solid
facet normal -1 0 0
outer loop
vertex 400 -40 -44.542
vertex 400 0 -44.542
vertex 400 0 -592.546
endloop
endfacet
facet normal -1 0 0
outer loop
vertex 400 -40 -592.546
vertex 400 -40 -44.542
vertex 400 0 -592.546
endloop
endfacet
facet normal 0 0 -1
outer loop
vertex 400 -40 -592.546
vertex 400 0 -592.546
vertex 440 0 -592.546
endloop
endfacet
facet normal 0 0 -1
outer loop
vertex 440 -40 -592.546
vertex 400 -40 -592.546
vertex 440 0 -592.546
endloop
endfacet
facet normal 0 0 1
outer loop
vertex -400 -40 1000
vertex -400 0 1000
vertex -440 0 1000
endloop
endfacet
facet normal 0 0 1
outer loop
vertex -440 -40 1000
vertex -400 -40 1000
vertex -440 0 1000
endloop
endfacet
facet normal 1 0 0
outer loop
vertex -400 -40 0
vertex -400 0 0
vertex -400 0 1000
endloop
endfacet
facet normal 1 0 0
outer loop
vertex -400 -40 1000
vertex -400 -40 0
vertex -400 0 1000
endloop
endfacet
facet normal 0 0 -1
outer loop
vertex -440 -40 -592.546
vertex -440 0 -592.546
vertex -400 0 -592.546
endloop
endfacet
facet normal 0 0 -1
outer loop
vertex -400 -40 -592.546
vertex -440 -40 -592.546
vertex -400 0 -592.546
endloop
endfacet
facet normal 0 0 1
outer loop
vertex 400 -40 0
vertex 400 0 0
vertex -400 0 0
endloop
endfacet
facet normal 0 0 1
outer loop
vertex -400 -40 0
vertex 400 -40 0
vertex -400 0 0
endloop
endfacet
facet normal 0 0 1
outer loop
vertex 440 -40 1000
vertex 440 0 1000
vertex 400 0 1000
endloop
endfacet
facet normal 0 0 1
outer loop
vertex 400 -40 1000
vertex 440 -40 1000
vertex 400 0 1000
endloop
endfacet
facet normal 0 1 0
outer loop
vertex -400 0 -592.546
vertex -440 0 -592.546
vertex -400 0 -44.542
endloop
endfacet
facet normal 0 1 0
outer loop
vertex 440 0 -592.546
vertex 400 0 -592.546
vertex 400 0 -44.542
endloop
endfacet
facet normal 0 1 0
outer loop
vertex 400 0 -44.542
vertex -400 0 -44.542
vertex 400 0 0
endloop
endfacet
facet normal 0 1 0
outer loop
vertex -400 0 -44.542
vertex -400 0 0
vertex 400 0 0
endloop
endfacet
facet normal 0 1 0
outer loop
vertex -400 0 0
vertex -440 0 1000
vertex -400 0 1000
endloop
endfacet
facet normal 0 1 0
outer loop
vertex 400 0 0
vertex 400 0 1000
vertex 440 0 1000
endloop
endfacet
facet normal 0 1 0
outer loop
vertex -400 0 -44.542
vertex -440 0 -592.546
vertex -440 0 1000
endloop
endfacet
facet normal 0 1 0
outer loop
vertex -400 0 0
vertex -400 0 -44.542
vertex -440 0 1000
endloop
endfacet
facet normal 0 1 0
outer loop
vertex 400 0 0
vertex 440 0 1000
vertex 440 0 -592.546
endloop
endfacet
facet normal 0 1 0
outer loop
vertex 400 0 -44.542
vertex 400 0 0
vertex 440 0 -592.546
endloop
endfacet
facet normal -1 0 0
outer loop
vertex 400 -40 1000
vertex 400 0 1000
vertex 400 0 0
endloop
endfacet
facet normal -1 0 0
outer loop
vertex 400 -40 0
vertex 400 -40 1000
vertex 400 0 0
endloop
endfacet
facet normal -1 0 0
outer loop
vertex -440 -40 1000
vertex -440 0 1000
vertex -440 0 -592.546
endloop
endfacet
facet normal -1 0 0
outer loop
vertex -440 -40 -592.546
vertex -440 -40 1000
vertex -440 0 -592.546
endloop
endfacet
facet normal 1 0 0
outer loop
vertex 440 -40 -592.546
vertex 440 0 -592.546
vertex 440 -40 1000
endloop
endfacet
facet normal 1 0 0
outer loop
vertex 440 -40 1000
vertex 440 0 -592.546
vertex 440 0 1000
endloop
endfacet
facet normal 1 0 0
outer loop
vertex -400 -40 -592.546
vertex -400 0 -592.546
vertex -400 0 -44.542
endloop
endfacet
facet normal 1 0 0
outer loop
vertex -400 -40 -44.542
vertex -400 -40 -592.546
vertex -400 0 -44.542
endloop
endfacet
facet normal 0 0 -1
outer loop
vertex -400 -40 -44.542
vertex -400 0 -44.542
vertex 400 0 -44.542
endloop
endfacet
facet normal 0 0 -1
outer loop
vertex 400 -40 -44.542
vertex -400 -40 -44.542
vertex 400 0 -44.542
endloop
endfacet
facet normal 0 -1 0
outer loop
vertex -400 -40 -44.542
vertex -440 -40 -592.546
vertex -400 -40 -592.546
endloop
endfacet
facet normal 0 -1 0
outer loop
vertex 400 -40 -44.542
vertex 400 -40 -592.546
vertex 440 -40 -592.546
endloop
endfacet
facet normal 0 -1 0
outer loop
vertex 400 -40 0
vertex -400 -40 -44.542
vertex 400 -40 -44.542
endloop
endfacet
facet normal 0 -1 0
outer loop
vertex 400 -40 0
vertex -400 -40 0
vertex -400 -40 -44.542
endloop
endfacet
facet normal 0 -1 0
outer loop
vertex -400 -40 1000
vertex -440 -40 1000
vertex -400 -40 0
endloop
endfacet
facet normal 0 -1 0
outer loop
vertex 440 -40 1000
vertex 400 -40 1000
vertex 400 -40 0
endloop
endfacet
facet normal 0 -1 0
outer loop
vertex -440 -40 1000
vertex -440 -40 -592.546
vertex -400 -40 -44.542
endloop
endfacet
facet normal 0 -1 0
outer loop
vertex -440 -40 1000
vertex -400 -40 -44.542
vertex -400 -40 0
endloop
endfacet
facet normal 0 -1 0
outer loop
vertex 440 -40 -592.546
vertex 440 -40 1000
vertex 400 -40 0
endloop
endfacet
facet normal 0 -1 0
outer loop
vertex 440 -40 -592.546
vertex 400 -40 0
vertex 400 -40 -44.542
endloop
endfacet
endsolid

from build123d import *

# Parameters (mm, degrees)
F1_DEPTH = 40


with BuildPart() as f1:
    # F0 (on Front) → F1 (new body)
    with BuildSketch(Plane.XZ):
        Polygon((0, -44.541744), (0, 0), (-400, 0), (-400, 1000), (-440, 1000), (-440, 0), (-440, -592.545841), (-400, -592.545841), (-400, -44.541744), align=None)
        Polygon((400, 0), (0, 0), (0, -44.541744), (400, -44.541744), (400, -592.545841), (440, -592.545841), (440, 0), (440, 1000), (400, 1000), align=None)
    extrude(amount=F1_DEPTH)


solid = f1.part
